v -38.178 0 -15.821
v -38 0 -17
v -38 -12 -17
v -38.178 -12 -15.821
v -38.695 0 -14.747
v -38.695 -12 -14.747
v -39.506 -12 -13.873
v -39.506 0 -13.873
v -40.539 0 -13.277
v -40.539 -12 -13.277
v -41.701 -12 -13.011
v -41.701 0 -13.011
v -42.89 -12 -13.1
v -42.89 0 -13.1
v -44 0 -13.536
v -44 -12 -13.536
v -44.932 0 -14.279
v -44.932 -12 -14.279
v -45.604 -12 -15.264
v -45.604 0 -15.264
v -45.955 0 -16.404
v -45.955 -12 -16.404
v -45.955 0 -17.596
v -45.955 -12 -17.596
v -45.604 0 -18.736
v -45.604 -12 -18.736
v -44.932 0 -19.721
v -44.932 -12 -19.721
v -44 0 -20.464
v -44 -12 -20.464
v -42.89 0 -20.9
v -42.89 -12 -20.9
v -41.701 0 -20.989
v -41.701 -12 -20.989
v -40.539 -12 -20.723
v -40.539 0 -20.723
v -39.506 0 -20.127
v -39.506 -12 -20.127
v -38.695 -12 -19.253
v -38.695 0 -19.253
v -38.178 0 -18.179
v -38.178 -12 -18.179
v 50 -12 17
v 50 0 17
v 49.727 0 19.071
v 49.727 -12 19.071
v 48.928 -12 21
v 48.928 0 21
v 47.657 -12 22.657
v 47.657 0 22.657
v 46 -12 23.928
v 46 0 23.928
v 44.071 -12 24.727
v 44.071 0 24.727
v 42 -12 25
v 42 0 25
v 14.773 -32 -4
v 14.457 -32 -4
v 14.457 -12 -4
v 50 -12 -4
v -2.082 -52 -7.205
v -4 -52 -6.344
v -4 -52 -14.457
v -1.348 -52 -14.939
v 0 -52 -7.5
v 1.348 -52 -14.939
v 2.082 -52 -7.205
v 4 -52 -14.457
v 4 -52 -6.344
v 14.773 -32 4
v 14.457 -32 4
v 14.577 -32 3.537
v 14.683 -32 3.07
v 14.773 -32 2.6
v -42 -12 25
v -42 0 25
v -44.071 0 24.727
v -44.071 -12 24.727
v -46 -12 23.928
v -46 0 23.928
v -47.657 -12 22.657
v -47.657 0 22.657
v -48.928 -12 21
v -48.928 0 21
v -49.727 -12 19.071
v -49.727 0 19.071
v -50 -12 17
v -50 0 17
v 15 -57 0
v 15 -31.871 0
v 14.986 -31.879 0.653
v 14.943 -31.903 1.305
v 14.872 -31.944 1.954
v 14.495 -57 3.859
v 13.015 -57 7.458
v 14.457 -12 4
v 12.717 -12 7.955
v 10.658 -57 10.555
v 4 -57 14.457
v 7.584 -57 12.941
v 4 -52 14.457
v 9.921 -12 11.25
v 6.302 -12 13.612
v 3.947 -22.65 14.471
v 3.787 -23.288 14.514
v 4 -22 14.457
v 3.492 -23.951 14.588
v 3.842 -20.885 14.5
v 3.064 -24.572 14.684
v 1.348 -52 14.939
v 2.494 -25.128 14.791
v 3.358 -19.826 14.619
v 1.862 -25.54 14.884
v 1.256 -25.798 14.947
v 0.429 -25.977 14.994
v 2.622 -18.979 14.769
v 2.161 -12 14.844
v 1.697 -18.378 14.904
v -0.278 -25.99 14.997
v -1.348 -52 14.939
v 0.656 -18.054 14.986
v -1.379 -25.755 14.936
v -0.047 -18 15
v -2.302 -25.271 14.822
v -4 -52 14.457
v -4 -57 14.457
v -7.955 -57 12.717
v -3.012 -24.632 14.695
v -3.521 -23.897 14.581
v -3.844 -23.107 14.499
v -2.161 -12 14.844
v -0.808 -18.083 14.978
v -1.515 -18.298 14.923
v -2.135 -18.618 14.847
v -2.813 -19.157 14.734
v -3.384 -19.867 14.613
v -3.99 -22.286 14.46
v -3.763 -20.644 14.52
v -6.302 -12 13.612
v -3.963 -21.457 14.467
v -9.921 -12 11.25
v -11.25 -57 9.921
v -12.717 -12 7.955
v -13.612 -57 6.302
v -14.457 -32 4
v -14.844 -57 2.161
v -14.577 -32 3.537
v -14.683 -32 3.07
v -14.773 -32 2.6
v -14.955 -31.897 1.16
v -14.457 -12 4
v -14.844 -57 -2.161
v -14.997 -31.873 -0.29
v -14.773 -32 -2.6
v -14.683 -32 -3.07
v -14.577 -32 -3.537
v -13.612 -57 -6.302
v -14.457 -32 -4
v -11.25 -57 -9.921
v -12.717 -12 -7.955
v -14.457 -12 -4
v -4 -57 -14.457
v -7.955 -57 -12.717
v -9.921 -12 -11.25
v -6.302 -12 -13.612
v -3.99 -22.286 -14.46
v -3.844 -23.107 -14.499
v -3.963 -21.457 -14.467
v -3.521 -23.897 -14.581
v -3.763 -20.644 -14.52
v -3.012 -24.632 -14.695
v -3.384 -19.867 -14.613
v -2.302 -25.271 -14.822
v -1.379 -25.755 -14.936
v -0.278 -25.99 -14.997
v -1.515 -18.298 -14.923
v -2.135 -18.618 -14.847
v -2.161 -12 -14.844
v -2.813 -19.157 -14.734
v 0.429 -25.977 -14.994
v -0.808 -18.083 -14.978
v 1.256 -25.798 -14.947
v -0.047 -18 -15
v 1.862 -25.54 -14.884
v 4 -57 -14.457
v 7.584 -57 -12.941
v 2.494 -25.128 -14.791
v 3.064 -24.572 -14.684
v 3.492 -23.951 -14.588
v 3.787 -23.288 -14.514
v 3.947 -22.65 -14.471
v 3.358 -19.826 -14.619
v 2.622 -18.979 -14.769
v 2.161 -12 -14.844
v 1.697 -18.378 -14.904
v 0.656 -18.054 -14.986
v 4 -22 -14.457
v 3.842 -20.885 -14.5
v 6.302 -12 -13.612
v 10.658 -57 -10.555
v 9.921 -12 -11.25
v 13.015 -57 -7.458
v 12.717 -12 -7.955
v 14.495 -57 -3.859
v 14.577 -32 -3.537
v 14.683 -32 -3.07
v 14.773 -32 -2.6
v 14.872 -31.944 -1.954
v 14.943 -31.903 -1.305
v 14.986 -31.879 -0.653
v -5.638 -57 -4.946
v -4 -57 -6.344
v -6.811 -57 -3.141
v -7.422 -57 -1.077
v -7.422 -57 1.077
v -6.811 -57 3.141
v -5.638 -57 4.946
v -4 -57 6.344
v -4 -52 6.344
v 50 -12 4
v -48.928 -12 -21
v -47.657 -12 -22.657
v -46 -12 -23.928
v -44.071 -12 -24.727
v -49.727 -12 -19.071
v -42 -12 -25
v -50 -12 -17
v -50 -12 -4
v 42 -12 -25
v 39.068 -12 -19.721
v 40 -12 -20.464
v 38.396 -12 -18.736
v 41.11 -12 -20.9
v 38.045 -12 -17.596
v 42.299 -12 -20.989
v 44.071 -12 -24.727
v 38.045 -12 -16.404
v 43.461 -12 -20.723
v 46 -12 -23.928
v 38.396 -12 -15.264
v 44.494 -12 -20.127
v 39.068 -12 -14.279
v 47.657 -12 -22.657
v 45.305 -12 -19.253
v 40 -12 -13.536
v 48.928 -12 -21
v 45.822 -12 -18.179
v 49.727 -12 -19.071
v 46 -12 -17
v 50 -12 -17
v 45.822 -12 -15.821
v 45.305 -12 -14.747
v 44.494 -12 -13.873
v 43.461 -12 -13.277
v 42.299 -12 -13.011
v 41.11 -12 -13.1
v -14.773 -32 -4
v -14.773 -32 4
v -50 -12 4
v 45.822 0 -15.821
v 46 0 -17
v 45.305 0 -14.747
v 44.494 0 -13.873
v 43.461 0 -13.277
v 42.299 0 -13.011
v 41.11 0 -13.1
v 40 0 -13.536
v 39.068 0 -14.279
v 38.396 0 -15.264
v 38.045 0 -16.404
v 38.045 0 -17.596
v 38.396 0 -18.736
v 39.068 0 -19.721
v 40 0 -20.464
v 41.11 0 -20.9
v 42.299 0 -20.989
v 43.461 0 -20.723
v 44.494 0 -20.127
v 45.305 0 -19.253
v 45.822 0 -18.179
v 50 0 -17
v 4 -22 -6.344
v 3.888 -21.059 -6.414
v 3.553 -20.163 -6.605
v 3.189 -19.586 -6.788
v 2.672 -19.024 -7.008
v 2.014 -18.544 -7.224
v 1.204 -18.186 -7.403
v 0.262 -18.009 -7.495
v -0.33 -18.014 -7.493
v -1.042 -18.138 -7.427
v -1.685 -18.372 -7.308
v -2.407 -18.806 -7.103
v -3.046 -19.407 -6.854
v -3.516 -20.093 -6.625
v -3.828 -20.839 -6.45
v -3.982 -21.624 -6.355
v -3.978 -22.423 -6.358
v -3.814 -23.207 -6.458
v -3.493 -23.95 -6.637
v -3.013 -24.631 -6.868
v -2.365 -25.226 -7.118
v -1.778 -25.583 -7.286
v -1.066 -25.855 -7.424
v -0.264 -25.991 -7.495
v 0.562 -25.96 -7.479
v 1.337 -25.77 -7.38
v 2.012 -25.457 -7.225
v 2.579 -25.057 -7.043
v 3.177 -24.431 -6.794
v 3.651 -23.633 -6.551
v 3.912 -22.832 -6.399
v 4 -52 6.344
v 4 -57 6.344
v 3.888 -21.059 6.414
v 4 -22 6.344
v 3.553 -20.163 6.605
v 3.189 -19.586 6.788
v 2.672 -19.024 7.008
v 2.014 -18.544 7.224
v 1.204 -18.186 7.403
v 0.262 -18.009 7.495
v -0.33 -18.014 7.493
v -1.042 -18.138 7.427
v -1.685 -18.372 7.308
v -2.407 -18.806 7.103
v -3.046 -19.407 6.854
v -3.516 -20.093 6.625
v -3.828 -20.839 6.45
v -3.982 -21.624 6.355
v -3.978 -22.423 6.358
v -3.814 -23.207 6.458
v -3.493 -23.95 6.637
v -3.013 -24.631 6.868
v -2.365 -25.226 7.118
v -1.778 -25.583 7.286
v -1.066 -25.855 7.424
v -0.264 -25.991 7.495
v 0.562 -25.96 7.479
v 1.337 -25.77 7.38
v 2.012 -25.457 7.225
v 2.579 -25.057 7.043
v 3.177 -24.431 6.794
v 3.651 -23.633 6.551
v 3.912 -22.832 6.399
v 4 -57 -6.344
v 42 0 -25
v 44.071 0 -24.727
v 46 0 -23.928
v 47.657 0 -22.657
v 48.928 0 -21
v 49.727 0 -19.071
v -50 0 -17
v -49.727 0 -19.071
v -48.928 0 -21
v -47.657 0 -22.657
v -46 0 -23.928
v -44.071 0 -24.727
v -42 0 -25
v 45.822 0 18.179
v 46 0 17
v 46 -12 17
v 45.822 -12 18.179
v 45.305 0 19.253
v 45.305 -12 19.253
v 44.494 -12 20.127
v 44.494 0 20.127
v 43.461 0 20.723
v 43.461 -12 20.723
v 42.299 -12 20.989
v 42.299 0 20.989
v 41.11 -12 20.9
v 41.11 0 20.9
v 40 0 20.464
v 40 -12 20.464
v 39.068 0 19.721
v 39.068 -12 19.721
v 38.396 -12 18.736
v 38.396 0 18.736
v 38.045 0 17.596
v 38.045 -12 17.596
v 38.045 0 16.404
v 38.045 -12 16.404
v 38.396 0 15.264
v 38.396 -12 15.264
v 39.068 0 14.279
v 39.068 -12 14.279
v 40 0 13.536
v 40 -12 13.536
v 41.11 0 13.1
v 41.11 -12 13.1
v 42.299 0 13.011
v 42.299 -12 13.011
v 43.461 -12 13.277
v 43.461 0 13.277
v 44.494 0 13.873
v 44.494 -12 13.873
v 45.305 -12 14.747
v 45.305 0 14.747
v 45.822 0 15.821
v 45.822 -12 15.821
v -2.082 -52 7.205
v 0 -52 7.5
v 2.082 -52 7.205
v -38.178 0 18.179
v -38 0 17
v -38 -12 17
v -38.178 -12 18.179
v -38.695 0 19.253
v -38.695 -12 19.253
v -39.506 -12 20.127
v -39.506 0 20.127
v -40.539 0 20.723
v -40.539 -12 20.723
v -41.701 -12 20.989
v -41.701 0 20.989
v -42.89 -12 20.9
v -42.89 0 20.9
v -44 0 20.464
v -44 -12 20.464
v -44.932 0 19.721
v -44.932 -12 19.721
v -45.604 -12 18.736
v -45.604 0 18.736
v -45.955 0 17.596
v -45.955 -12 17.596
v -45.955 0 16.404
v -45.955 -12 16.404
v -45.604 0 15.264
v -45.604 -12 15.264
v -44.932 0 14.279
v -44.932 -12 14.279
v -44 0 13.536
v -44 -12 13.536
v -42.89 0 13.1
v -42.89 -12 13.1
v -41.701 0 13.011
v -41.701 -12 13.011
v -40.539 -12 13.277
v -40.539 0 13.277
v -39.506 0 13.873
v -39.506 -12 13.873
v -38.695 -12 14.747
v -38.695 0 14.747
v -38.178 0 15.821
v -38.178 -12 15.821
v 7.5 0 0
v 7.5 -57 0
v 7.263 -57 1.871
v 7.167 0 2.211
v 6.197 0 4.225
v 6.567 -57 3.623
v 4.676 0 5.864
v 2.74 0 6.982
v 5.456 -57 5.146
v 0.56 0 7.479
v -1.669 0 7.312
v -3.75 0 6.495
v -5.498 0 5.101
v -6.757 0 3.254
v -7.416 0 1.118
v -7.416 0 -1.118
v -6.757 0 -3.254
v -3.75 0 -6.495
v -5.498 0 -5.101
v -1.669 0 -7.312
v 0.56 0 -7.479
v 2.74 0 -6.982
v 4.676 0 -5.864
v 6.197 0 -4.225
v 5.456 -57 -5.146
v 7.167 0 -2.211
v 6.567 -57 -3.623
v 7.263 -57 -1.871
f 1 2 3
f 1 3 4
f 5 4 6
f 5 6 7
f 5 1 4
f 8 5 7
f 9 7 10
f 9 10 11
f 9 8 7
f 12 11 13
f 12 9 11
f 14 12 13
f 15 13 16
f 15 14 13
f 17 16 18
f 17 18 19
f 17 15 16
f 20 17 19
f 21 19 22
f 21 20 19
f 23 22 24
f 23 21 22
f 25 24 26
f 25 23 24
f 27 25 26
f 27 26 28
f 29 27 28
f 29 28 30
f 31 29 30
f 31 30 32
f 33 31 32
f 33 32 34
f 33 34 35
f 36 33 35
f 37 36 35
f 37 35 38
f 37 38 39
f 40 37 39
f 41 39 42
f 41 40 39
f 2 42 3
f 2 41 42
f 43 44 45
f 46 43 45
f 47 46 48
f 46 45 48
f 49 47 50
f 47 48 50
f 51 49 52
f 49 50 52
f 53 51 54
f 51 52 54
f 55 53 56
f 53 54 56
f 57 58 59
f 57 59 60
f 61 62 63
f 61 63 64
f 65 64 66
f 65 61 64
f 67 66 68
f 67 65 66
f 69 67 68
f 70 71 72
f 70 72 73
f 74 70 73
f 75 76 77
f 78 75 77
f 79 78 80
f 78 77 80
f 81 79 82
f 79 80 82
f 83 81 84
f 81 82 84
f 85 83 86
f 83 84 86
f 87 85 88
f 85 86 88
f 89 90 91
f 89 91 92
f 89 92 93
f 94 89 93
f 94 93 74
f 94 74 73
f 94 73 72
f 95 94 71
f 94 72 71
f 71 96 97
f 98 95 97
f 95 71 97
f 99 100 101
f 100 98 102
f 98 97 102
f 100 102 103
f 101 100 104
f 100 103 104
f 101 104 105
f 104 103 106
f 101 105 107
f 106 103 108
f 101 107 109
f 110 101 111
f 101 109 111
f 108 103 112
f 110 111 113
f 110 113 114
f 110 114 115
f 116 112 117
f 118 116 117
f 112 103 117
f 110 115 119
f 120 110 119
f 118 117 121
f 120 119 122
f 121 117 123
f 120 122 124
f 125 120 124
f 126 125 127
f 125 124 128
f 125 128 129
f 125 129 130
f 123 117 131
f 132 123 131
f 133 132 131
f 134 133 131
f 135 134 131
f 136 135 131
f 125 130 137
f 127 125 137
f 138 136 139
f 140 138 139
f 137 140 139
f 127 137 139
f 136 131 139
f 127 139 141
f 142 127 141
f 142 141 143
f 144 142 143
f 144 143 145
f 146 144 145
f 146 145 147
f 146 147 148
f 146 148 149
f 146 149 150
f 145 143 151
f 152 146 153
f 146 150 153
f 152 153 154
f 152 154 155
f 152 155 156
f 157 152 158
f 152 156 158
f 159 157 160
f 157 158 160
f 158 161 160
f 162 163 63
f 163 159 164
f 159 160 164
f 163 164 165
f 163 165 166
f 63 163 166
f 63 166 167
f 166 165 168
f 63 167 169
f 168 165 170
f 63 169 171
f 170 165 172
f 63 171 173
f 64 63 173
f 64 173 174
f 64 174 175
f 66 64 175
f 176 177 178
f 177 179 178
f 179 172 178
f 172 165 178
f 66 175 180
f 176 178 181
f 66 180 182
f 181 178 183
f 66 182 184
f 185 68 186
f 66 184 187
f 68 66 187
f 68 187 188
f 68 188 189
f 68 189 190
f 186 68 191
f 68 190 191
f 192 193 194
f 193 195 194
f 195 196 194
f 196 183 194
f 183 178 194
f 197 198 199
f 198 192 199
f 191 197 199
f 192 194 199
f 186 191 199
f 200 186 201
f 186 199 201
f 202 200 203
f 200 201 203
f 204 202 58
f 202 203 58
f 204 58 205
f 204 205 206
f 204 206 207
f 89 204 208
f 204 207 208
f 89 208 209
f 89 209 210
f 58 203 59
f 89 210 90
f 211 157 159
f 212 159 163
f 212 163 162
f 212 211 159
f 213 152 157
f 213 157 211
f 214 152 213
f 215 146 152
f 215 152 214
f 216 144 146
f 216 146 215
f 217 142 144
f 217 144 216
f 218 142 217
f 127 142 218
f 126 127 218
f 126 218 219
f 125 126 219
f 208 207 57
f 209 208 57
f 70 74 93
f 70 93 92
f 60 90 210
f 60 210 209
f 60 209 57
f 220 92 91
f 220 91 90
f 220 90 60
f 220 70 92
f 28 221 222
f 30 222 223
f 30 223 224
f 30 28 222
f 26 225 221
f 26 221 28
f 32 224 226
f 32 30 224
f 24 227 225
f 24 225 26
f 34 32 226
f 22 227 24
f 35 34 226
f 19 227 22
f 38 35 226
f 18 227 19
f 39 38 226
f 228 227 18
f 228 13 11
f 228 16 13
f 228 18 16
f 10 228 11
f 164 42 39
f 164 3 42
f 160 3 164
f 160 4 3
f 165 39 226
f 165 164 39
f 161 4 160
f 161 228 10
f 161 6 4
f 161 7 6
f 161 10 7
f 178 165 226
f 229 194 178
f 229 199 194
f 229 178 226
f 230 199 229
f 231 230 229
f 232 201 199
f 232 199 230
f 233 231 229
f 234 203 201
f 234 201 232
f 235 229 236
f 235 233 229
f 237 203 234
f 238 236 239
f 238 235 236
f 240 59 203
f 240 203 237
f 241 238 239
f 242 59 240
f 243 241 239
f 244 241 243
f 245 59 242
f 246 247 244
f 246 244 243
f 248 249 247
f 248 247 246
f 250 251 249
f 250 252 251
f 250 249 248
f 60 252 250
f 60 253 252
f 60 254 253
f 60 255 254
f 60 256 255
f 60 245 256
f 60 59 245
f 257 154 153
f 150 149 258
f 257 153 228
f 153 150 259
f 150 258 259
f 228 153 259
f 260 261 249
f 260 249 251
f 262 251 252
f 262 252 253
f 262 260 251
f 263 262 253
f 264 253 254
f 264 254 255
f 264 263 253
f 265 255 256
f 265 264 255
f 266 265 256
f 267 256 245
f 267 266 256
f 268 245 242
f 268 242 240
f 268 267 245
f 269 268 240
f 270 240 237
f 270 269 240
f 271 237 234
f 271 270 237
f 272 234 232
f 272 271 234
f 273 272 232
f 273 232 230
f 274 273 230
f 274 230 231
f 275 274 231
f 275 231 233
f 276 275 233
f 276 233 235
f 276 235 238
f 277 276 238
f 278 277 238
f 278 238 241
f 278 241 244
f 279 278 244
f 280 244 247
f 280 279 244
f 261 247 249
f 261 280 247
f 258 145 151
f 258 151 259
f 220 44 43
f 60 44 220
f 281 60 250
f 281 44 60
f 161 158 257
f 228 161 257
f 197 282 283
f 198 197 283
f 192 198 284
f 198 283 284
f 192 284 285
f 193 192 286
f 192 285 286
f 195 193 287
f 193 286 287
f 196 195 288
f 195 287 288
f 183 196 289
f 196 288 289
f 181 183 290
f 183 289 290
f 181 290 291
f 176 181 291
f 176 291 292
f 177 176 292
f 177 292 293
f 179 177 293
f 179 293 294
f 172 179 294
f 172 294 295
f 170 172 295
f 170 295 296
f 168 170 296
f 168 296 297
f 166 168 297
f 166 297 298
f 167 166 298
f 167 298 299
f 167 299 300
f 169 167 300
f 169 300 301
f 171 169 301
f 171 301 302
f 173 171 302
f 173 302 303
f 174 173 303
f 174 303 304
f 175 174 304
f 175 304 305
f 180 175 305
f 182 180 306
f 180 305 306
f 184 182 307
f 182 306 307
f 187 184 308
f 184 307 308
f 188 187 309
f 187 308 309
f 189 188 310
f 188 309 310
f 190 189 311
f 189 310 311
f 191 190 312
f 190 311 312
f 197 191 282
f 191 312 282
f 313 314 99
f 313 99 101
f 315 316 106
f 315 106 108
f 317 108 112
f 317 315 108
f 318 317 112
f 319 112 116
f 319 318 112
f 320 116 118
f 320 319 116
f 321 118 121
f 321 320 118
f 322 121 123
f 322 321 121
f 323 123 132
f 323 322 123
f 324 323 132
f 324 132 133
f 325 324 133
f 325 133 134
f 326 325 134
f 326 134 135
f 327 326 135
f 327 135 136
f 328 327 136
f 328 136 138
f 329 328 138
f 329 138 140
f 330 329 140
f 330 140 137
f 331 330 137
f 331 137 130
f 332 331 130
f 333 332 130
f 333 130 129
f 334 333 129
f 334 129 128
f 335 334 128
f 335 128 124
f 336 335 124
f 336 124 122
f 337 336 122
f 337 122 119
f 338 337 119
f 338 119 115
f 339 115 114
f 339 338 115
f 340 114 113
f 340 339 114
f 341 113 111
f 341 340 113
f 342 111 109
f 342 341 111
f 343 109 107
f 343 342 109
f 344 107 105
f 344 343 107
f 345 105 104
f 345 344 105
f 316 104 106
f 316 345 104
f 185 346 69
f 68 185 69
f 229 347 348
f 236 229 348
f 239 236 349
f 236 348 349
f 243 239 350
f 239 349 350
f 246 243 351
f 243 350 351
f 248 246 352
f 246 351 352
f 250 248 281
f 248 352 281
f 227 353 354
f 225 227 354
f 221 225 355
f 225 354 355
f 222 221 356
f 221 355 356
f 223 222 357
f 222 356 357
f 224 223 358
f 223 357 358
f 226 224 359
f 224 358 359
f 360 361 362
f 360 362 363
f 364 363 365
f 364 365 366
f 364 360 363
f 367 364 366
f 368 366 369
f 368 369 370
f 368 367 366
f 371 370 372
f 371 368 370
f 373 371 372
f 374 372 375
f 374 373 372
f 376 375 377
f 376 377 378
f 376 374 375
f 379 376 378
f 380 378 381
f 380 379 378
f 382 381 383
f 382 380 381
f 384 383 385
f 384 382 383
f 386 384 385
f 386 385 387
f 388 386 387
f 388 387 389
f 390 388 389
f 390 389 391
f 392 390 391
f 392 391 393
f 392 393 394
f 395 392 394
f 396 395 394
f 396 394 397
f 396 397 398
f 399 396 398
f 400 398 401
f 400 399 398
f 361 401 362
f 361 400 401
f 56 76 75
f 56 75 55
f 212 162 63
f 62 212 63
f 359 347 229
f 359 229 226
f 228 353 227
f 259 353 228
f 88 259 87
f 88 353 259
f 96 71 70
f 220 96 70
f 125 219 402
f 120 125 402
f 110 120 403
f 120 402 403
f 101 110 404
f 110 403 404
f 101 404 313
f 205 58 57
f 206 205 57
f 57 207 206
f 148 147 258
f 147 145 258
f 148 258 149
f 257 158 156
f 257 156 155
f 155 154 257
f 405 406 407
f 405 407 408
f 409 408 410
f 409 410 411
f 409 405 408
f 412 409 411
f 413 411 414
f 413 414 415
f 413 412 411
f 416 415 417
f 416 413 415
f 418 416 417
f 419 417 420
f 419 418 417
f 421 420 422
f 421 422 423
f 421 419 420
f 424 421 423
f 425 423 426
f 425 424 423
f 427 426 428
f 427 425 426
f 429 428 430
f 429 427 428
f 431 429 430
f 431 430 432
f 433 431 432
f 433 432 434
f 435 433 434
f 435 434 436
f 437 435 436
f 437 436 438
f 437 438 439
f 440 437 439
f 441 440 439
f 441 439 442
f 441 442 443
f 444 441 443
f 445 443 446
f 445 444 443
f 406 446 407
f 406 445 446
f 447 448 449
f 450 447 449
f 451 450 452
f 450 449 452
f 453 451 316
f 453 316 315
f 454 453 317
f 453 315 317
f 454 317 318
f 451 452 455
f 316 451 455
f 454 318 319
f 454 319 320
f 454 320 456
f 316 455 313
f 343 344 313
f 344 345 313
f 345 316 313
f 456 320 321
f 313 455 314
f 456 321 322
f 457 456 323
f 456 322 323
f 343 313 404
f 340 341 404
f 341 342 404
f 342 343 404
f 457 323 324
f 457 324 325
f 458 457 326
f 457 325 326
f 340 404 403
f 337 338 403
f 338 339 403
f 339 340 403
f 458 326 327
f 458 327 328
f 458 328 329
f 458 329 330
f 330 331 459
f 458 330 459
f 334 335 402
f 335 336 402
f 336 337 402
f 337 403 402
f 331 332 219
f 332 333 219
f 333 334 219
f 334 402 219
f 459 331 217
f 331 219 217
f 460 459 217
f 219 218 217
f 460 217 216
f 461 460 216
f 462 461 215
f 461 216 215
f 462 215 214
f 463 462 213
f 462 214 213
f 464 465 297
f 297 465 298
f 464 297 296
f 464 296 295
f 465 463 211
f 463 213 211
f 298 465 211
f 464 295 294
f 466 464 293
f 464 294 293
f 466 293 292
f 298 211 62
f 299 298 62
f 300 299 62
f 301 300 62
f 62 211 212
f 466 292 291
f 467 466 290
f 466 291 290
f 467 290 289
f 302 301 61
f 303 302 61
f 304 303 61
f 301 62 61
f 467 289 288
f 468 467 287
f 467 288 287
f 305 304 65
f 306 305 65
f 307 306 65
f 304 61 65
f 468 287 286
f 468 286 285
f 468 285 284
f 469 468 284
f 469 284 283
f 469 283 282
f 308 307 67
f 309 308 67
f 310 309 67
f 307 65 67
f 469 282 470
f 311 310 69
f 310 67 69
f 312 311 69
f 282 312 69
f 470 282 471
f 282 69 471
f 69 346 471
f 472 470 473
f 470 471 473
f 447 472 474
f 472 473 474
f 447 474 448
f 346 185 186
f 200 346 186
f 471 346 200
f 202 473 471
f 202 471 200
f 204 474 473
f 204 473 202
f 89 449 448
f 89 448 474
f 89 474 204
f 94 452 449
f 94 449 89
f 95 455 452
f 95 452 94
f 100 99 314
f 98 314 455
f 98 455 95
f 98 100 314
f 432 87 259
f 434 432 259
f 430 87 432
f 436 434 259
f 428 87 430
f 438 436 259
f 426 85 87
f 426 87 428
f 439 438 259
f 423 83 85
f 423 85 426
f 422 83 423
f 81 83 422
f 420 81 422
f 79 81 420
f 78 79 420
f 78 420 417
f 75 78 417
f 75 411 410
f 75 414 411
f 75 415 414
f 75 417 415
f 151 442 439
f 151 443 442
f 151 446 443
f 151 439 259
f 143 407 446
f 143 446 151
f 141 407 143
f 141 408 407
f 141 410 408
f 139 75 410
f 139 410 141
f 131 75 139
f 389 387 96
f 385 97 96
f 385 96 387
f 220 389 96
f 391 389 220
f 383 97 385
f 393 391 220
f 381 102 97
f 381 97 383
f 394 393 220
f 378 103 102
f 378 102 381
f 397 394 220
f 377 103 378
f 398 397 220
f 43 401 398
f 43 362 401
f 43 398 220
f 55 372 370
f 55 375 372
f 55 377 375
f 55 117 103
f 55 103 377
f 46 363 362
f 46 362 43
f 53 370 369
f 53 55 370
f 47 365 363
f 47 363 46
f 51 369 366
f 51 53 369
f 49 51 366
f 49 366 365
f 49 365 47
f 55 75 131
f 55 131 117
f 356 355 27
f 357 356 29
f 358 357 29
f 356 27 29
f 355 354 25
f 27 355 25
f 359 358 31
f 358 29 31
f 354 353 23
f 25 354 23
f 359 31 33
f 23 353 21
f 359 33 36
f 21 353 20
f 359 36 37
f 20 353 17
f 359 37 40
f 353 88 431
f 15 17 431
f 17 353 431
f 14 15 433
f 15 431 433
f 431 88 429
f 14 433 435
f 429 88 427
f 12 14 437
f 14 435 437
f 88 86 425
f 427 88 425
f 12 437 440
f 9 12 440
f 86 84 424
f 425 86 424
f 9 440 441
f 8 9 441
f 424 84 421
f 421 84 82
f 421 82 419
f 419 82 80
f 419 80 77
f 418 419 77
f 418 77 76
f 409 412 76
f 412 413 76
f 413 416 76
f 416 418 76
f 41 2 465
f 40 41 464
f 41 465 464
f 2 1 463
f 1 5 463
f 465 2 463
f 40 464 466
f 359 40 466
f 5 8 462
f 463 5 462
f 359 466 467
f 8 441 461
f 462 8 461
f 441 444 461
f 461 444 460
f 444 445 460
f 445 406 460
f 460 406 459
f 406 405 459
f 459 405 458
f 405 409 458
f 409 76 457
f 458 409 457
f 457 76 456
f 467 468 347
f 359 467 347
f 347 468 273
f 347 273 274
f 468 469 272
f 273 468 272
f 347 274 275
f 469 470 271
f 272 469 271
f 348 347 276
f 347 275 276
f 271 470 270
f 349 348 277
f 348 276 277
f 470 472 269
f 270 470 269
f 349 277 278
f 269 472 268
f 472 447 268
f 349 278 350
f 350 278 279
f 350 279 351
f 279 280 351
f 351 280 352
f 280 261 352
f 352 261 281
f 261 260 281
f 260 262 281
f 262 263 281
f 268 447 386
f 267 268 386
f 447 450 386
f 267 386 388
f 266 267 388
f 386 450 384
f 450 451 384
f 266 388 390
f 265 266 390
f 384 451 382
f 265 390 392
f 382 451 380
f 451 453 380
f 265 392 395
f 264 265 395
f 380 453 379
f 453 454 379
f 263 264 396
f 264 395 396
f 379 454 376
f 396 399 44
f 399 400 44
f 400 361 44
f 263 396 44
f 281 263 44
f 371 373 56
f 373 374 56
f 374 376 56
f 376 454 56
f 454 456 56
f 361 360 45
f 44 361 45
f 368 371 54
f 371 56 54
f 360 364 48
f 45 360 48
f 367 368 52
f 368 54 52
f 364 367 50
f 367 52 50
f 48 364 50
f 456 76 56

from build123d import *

# Parameters (mm, degrees)
SKETCH_R             = 4
PAD_DEPTH            = 12
SKETCH001_R          = 15
PAD001_DEPTH         = 45
PAD002_DEPTH         = 4
SKETCH003_R          = 7.5
POCKET_DEPTH         = 57.001
SKETCH004_R          = 4
SKETCH004_W          = 8
SKETCH004_H          = 5
POCKET001_DEPTH      = 25.001
POCKET001_DEPTH_BACK = -25.001


with BuildPart() as part:
    # Sketch → Pad (new body)
    with BuildSketch(Plane.XZ):
        with BuildLine():
            ThreePointArc((-42, 25), (-47.656854, 22.656854), (-50, 17))
            Line((-50, -17), (-50, 17))
            ThreePointArc((-50, -17), (-47.656854, -22.656854), (-42, -25))
            Line((42, -25), (-42, -25))
            ThreePointArc((42, -25), (47.656854, -22.656854), (50, -17))
            Line((50, 17), (50, -17))
            ThreePointArc((50, 17), (47.656854, 22.656854), (42, 25))
            Line((-42, 25), (42, 25))
        make_face()
        with Locations((-42, 17)):
            Circle(SKETCH_R, mode=Mode.SUBTRACT)
        with Locations((-42, -17)):
            Circle(SKETCH_R, mode=Mode.SUBTRACT)
        with Locations((42, 17)):
            Circle(SKETCH_R, mode=Mode.SUBTRACT)
        with Locations((42, -17)):
            Circle(SKETCH_R, mode=Mode.SUBTRACT)
    extrude(amount=PAD_DEPTH)

    # Sketch001 (on Face14 of Pad) → Pad001 (join)
    with BuildSketch(Plane.XZ.offset(12)):
        Circle(SKETCH001_R)
    extrude(amount=PAD001_DEPTH)

    # Sketch002 → Pad002 (join, symmetric)
    with BuildSketch(Plane.XY):
        Polygon((-5.727757, -32), (-14.773027, -32), (-50, -12), (-5.727757, -12), align=None)
    pad002 = extrude(amount=PAD002_DEPTH, both=True)

    # Mirrored: Pad002 across Sketch002 V_Axis
    add(pad002.mirror(Plane(origin=(0, 0, 0), x_dir=(0, 0, 1), z_dir=(1, 0, 0))))

    # Sketch003 (on Face26 of Mirrored) → Pocket (cut, through all)
    with BuildSketch(Plane.XZ.offset(57)):
        Circle(SKETCH003_R)
    extrude(amount=-POCKET_DEPTH, mode=Mode.SUBTRACT)

    # Sketch004 → Pocket001 (cut, two sides)
    with BuildSketch(Plane.XY) as pocket001_sk:
        with Locations((0, -22)):
            Circle(SKETCH004_R)
        with Locations((0, -54.5)):
            Rectangle(SKETCH004_W, SKETCH004_H)
    extrude(amount=-POCKET001_DEPTH, mode=Mode.SUBTRACT)
    extrude(pocket001_sk.sketch, amount=-POCKET001_DEPTH_BACK, mode=Mode.SUBTRACT)


solid = part.part
